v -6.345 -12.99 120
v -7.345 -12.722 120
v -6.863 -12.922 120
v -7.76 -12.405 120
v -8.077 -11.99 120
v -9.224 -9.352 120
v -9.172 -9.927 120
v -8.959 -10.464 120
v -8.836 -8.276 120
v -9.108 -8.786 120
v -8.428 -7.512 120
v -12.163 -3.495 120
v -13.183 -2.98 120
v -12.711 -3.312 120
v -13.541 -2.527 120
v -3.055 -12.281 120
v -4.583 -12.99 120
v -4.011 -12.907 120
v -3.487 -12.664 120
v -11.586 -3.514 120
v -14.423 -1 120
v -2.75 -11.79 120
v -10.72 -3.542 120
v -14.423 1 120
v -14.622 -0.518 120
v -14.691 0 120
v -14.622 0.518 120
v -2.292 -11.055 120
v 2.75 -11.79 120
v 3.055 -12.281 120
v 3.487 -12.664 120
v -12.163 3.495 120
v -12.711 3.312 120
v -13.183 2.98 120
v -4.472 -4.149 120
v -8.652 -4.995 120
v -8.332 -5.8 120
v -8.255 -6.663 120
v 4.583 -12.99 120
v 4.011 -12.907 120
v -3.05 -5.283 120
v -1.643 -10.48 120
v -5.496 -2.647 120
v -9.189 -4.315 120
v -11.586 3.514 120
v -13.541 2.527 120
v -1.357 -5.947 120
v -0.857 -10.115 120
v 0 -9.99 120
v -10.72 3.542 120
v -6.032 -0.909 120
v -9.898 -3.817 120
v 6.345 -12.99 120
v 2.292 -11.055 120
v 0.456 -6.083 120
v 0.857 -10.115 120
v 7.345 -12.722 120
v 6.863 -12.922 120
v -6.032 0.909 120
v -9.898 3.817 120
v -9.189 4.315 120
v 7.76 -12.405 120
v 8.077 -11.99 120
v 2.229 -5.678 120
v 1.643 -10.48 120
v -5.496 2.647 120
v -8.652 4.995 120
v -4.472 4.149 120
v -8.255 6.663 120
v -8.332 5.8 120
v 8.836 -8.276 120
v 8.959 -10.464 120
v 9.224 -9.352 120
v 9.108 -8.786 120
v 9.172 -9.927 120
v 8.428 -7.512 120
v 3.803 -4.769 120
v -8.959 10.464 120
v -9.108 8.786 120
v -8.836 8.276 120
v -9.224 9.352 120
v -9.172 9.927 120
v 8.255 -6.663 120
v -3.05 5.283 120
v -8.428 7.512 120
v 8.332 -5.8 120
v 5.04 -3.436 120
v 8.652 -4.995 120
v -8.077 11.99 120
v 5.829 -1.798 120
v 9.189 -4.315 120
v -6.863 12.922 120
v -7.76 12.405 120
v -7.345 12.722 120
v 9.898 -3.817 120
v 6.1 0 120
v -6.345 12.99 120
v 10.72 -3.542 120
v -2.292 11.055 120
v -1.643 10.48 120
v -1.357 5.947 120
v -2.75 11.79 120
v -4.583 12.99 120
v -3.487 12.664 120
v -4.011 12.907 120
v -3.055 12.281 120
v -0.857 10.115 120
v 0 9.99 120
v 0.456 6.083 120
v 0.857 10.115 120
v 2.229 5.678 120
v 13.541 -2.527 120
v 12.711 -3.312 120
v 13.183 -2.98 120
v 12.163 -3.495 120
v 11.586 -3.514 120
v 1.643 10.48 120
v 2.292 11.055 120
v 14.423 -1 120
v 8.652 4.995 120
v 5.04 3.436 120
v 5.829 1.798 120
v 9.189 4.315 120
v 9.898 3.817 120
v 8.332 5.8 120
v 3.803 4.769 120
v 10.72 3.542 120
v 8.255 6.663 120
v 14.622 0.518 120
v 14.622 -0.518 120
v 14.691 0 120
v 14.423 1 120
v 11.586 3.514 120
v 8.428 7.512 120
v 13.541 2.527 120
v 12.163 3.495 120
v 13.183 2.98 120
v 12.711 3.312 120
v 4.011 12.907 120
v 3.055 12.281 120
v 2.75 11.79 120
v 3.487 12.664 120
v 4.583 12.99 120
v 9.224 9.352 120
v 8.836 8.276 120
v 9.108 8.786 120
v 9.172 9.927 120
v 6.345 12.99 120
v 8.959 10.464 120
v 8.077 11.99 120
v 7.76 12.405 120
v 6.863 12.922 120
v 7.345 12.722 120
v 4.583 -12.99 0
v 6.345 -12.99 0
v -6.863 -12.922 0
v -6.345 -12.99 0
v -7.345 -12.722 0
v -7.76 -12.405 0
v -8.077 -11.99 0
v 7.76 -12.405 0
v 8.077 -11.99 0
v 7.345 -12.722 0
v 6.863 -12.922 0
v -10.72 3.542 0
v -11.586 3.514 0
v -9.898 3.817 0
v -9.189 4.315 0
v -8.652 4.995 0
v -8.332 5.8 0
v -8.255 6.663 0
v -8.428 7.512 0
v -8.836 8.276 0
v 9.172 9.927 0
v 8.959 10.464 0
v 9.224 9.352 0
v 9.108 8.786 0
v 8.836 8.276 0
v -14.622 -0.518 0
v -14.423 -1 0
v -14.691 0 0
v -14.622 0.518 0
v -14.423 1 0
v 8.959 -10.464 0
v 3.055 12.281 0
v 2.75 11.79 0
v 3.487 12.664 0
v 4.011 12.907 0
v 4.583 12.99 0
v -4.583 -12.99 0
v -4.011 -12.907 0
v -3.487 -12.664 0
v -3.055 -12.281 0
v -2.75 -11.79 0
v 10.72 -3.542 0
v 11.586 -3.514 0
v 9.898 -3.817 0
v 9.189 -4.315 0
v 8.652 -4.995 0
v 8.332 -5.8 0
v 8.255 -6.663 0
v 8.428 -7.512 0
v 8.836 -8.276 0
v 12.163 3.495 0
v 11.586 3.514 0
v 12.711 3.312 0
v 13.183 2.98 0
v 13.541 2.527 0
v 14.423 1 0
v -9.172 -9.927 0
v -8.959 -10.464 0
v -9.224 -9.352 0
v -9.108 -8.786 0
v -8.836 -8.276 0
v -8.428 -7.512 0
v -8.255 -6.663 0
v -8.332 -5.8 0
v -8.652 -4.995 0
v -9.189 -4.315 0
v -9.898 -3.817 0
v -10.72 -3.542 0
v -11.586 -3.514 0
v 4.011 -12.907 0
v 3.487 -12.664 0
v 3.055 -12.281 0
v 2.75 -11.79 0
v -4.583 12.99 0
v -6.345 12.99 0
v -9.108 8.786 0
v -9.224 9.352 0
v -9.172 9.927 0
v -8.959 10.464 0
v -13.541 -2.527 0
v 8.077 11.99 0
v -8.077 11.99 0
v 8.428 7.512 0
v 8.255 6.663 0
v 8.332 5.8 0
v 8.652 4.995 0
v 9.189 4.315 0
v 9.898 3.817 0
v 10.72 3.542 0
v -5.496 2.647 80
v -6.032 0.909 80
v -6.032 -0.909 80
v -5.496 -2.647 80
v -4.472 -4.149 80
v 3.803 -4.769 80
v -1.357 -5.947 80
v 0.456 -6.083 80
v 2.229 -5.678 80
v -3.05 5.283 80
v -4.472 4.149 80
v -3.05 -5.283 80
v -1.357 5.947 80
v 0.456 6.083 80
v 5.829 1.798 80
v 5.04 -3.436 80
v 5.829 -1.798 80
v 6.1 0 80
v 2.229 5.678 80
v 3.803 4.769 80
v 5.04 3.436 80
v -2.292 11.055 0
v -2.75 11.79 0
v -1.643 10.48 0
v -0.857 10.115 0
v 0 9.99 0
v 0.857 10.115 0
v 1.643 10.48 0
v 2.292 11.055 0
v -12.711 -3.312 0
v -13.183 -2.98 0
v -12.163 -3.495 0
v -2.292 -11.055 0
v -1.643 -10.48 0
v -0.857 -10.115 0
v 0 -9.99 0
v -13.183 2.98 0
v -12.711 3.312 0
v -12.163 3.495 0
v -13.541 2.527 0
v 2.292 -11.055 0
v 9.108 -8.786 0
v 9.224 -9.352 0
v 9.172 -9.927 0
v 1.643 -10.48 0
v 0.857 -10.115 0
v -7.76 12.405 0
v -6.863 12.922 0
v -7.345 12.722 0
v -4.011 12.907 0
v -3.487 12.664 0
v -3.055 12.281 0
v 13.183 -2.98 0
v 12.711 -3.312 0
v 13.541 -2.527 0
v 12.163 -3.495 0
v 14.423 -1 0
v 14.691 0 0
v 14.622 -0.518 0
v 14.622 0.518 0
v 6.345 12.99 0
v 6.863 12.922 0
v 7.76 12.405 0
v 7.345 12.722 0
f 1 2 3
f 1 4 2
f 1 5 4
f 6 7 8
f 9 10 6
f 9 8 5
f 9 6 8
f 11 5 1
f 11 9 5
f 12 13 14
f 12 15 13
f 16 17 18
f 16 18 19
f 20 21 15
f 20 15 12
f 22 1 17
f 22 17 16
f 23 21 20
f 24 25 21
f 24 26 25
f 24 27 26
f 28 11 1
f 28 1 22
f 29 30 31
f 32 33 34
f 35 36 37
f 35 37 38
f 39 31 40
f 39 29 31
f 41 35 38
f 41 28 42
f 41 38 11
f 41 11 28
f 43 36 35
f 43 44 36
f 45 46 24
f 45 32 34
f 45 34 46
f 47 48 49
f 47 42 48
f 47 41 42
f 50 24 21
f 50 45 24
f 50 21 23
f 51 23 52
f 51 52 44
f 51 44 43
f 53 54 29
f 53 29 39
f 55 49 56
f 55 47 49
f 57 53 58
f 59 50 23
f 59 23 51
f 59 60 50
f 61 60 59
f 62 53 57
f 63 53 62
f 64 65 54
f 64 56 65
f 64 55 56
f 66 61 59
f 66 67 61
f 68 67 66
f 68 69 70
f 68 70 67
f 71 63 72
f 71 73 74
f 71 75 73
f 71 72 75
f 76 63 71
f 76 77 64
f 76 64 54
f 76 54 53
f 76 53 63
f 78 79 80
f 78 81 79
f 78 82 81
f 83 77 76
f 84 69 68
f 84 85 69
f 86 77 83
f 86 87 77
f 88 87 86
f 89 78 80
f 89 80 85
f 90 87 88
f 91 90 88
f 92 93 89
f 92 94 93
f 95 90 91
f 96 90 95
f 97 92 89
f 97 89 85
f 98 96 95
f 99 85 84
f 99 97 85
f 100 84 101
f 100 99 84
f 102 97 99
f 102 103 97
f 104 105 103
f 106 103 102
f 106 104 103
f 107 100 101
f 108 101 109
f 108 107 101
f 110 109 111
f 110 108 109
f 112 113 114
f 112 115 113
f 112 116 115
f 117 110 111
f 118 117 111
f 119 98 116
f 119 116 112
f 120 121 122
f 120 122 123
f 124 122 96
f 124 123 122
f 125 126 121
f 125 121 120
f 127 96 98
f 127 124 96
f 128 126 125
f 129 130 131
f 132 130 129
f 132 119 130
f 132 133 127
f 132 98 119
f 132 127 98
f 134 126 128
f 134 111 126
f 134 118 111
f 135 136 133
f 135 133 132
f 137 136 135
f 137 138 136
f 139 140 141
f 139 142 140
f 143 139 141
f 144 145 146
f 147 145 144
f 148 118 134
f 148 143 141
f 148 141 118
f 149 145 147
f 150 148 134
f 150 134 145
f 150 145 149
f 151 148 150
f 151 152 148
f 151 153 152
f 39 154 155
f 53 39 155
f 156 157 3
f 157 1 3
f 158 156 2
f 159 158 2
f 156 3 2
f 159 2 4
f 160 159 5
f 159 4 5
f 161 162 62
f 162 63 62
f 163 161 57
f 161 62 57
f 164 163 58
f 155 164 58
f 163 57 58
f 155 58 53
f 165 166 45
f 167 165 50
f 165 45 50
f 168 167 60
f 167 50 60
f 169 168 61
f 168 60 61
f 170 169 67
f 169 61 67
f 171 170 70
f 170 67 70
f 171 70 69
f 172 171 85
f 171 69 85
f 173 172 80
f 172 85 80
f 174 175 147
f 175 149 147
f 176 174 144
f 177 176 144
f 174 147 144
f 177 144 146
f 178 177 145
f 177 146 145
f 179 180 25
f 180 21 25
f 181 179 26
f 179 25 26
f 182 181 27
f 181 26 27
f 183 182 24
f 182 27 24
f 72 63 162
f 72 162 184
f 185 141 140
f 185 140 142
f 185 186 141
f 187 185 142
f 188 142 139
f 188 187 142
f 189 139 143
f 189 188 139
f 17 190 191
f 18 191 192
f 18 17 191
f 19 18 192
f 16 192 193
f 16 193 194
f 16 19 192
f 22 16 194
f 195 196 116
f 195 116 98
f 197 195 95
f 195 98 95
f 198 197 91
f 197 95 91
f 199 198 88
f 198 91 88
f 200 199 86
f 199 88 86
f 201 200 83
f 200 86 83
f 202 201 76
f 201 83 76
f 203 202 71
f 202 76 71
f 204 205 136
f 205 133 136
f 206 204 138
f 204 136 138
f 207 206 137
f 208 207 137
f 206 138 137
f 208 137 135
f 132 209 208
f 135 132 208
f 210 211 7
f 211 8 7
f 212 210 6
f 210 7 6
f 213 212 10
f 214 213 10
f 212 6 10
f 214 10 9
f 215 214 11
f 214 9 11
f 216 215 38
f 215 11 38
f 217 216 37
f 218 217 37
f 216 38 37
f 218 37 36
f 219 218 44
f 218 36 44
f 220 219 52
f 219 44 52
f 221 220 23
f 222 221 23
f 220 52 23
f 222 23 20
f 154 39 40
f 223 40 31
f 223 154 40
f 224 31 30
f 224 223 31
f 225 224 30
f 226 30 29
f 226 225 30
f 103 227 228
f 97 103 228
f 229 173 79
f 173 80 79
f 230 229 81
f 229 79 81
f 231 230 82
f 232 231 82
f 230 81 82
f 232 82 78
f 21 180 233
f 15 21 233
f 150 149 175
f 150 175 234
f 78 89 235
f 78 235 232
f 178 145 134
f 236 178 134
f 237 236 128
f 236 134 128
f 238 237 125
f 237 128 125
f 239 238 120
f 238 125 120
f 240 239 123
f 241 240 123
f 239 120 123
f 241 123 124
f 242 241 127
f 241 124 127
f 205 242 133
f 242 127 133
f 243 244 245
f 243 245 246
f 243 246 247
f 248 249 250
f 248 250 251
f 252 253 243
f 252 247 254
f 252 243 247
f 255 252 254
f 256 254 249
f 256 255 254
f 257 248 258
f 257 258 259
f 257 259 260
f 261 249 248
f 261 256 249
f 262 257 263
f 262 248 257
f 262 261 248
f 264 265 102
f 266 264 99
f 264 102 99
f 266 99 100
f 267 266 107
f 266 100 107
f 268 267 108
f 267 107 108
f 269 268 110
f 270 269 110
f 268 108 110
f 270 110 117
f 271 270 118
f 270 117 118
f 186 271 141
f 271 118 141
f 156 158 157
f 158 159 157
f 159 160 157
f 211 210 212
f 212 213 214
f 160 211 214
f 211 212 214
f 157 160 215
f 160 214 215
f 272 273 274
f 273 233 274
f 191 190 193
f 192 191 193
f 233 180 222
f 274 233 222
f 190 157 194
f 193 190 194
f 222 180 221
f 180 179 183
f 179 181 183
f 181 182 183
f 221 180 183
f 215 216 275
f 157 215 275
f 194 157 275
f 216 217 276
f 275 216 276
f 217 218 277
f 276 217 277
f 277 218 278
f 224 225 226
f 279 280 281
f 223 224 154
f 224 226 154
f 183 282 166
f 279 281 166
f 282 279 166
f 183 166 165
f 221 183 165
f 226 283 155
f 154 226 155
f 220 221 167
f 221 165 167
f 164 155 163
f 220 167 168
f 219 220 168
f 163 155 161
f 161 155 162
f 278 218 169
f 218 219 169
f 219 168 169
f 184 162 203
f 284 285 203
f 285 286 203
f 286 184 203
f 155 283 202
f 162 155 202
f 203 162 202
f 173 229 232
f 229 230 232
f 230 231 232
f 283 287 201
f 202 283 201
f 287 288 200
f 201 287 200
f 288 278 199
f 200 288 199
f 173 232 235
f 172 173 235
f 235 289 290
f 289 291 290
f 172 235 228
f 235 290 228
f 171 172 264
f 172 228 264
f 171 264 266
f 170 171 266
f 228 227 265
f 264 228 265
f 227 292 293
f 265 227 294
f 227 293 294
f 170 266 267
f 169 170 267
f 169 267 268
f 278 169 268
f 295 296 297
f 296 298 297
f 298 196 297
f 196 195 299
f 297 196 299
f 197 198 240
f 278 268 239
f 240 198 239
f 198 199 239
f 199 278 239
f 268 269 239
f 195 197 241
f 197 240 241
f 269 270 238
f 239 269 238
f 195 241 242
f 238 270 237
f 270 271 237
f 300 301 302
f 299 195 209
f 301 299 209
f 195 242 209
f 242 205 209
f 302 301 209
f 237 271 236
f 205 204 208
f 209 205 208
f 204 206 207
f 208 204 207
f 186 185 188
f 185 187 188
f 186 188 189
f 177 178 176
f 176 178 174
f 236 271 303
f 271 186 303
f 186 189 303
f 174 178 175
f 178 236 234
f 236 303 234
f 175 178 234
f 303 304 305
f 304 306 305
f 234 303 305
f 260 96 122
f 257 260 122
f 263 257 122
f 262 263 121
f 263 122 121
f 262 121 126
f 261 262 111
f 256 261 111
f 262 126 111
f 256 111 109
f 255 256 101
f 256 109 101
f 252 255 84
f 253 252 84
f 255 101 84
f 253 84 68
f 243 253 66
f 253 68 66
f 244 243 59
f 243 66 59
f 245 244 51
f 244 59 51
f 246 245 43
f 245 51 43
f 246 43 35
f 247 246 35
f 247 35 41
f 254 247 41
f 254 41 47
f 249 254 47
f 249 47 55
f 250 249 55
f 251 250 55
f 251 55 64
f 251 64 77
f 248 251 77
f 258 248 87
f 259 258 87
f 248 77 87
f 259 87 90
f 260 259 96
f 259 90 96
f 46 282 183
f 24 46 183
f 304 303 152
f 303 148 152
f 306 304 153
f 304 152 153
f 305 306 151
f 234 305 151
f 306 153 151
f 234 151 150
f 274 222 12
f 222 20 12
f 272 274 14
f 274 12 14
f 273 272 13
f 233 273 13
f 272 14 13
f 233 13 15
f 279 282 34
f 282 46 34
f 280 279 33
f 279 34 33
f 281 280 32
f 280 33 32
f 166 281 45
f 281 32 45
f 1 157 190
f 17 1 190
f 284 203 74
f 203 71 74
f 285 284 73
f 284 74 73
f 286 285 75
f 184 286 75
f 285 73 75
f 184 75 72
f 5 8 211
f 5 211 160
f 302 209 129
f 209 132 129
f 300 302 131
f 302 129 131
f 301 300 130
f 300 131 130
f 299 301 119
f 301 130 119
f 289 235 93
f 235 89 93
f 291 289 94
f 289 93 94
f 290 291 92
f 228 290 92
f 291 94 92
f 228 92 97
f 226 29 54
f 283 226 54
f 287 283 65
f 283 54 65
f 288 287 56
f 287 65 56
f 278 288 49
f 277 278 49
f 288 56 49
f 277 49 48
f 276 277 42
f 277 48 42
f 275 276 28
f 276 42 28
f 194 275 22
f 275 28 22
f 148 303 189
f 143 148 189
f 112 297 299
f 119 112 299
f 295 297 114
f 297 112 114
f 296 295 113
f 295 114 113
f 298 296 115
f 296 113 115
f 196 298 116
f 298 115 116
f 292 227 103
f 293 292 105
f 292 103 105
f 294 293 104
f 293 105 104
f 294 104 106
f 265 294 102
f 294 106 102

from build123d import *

# Parameters (mm, degrees)
PAD_DEPTH       = 120
SKETCH001_R     = 6.1
POCKET_DEPTH    = 40
SKETCH002_R     = 3
POCKET001_DEPTH = 120.001
FILLET_R        = 2


with BuildPart() as part:
    # Sketch → Pad (new body)
    with BuildSketch(Plane.XY):
        Polygon((-7.5, -12.990381), (7.5, -12.990381), (15, 0), (7.5, 12.990381), (-7.5, 12.990381), (-15, 0), align=None)
    extrude(amount=PAD_DEPTH)

    # Sketch001 (on Face8 of Pad) → Pocket (cut)
    with BuildSketch(Plane.XY.offset(120)):
        Circle(SKETCH001_R)
    extrude(amount=-POCKET_DEPTH, mode=Mode.SUBTRACT)

    # Sketch002 (on Face5 of Pocket) → Pocket001 (cut, through all)
    with BuildSketch(Plane.XY.offset(120)):
        with Locations((-11.25, 6.495191)):
            Circle(SKETCH002_R)
        with Locations((0, 12.990381)):
            Circle(SKETCH002_R)
        with Locations((11.25, 6.495191)):
            Circle(SKETCH002_R)
        with Locations((11.25, -6.495191)):
            Circle(SKETCH002_R)
        with Locations((0, -12.990381)):
            Circle(SKETCH002_R)
        with Locations((-11.25, -6.495191)):
            Circle(SKETCH002_R)
    extrude(amount=-POCKET001_DEPTH, mode=Mode.SUBTRACT)

    # Fillet
    fillet_edges = [part.edges().sort_by_distance(p)[0] for p in [
        (-9.75, 9.093267, 60),
        (-3, 12.990381, 60),
        (-7.5, 12.990381, 60),
        (3, 12.990381, 60),
        (7.5, 12.990381, 60),
        (-15, 0, 60),
        (-12.75, 3.897114, 60),
        (-12.75, -3.897114, 60),
        (9.75, 9.093267, 60),
        (12.75, 3.897114, 60),
        (15, 0, 60),
        (12.75, -3.897114, 60),
        (9.75, -9.093267, 60),
        (7.5, -12.990381, 60),
        (3, -12.990381, 60),
        (-3, -12.990381, 60),
        (-7.5, -12.990381, 60),
        (-9.75, -9.093267, 60),
    ]]
    fillet(fillet_edges, radius=FILLET_R)


solid = part.part
